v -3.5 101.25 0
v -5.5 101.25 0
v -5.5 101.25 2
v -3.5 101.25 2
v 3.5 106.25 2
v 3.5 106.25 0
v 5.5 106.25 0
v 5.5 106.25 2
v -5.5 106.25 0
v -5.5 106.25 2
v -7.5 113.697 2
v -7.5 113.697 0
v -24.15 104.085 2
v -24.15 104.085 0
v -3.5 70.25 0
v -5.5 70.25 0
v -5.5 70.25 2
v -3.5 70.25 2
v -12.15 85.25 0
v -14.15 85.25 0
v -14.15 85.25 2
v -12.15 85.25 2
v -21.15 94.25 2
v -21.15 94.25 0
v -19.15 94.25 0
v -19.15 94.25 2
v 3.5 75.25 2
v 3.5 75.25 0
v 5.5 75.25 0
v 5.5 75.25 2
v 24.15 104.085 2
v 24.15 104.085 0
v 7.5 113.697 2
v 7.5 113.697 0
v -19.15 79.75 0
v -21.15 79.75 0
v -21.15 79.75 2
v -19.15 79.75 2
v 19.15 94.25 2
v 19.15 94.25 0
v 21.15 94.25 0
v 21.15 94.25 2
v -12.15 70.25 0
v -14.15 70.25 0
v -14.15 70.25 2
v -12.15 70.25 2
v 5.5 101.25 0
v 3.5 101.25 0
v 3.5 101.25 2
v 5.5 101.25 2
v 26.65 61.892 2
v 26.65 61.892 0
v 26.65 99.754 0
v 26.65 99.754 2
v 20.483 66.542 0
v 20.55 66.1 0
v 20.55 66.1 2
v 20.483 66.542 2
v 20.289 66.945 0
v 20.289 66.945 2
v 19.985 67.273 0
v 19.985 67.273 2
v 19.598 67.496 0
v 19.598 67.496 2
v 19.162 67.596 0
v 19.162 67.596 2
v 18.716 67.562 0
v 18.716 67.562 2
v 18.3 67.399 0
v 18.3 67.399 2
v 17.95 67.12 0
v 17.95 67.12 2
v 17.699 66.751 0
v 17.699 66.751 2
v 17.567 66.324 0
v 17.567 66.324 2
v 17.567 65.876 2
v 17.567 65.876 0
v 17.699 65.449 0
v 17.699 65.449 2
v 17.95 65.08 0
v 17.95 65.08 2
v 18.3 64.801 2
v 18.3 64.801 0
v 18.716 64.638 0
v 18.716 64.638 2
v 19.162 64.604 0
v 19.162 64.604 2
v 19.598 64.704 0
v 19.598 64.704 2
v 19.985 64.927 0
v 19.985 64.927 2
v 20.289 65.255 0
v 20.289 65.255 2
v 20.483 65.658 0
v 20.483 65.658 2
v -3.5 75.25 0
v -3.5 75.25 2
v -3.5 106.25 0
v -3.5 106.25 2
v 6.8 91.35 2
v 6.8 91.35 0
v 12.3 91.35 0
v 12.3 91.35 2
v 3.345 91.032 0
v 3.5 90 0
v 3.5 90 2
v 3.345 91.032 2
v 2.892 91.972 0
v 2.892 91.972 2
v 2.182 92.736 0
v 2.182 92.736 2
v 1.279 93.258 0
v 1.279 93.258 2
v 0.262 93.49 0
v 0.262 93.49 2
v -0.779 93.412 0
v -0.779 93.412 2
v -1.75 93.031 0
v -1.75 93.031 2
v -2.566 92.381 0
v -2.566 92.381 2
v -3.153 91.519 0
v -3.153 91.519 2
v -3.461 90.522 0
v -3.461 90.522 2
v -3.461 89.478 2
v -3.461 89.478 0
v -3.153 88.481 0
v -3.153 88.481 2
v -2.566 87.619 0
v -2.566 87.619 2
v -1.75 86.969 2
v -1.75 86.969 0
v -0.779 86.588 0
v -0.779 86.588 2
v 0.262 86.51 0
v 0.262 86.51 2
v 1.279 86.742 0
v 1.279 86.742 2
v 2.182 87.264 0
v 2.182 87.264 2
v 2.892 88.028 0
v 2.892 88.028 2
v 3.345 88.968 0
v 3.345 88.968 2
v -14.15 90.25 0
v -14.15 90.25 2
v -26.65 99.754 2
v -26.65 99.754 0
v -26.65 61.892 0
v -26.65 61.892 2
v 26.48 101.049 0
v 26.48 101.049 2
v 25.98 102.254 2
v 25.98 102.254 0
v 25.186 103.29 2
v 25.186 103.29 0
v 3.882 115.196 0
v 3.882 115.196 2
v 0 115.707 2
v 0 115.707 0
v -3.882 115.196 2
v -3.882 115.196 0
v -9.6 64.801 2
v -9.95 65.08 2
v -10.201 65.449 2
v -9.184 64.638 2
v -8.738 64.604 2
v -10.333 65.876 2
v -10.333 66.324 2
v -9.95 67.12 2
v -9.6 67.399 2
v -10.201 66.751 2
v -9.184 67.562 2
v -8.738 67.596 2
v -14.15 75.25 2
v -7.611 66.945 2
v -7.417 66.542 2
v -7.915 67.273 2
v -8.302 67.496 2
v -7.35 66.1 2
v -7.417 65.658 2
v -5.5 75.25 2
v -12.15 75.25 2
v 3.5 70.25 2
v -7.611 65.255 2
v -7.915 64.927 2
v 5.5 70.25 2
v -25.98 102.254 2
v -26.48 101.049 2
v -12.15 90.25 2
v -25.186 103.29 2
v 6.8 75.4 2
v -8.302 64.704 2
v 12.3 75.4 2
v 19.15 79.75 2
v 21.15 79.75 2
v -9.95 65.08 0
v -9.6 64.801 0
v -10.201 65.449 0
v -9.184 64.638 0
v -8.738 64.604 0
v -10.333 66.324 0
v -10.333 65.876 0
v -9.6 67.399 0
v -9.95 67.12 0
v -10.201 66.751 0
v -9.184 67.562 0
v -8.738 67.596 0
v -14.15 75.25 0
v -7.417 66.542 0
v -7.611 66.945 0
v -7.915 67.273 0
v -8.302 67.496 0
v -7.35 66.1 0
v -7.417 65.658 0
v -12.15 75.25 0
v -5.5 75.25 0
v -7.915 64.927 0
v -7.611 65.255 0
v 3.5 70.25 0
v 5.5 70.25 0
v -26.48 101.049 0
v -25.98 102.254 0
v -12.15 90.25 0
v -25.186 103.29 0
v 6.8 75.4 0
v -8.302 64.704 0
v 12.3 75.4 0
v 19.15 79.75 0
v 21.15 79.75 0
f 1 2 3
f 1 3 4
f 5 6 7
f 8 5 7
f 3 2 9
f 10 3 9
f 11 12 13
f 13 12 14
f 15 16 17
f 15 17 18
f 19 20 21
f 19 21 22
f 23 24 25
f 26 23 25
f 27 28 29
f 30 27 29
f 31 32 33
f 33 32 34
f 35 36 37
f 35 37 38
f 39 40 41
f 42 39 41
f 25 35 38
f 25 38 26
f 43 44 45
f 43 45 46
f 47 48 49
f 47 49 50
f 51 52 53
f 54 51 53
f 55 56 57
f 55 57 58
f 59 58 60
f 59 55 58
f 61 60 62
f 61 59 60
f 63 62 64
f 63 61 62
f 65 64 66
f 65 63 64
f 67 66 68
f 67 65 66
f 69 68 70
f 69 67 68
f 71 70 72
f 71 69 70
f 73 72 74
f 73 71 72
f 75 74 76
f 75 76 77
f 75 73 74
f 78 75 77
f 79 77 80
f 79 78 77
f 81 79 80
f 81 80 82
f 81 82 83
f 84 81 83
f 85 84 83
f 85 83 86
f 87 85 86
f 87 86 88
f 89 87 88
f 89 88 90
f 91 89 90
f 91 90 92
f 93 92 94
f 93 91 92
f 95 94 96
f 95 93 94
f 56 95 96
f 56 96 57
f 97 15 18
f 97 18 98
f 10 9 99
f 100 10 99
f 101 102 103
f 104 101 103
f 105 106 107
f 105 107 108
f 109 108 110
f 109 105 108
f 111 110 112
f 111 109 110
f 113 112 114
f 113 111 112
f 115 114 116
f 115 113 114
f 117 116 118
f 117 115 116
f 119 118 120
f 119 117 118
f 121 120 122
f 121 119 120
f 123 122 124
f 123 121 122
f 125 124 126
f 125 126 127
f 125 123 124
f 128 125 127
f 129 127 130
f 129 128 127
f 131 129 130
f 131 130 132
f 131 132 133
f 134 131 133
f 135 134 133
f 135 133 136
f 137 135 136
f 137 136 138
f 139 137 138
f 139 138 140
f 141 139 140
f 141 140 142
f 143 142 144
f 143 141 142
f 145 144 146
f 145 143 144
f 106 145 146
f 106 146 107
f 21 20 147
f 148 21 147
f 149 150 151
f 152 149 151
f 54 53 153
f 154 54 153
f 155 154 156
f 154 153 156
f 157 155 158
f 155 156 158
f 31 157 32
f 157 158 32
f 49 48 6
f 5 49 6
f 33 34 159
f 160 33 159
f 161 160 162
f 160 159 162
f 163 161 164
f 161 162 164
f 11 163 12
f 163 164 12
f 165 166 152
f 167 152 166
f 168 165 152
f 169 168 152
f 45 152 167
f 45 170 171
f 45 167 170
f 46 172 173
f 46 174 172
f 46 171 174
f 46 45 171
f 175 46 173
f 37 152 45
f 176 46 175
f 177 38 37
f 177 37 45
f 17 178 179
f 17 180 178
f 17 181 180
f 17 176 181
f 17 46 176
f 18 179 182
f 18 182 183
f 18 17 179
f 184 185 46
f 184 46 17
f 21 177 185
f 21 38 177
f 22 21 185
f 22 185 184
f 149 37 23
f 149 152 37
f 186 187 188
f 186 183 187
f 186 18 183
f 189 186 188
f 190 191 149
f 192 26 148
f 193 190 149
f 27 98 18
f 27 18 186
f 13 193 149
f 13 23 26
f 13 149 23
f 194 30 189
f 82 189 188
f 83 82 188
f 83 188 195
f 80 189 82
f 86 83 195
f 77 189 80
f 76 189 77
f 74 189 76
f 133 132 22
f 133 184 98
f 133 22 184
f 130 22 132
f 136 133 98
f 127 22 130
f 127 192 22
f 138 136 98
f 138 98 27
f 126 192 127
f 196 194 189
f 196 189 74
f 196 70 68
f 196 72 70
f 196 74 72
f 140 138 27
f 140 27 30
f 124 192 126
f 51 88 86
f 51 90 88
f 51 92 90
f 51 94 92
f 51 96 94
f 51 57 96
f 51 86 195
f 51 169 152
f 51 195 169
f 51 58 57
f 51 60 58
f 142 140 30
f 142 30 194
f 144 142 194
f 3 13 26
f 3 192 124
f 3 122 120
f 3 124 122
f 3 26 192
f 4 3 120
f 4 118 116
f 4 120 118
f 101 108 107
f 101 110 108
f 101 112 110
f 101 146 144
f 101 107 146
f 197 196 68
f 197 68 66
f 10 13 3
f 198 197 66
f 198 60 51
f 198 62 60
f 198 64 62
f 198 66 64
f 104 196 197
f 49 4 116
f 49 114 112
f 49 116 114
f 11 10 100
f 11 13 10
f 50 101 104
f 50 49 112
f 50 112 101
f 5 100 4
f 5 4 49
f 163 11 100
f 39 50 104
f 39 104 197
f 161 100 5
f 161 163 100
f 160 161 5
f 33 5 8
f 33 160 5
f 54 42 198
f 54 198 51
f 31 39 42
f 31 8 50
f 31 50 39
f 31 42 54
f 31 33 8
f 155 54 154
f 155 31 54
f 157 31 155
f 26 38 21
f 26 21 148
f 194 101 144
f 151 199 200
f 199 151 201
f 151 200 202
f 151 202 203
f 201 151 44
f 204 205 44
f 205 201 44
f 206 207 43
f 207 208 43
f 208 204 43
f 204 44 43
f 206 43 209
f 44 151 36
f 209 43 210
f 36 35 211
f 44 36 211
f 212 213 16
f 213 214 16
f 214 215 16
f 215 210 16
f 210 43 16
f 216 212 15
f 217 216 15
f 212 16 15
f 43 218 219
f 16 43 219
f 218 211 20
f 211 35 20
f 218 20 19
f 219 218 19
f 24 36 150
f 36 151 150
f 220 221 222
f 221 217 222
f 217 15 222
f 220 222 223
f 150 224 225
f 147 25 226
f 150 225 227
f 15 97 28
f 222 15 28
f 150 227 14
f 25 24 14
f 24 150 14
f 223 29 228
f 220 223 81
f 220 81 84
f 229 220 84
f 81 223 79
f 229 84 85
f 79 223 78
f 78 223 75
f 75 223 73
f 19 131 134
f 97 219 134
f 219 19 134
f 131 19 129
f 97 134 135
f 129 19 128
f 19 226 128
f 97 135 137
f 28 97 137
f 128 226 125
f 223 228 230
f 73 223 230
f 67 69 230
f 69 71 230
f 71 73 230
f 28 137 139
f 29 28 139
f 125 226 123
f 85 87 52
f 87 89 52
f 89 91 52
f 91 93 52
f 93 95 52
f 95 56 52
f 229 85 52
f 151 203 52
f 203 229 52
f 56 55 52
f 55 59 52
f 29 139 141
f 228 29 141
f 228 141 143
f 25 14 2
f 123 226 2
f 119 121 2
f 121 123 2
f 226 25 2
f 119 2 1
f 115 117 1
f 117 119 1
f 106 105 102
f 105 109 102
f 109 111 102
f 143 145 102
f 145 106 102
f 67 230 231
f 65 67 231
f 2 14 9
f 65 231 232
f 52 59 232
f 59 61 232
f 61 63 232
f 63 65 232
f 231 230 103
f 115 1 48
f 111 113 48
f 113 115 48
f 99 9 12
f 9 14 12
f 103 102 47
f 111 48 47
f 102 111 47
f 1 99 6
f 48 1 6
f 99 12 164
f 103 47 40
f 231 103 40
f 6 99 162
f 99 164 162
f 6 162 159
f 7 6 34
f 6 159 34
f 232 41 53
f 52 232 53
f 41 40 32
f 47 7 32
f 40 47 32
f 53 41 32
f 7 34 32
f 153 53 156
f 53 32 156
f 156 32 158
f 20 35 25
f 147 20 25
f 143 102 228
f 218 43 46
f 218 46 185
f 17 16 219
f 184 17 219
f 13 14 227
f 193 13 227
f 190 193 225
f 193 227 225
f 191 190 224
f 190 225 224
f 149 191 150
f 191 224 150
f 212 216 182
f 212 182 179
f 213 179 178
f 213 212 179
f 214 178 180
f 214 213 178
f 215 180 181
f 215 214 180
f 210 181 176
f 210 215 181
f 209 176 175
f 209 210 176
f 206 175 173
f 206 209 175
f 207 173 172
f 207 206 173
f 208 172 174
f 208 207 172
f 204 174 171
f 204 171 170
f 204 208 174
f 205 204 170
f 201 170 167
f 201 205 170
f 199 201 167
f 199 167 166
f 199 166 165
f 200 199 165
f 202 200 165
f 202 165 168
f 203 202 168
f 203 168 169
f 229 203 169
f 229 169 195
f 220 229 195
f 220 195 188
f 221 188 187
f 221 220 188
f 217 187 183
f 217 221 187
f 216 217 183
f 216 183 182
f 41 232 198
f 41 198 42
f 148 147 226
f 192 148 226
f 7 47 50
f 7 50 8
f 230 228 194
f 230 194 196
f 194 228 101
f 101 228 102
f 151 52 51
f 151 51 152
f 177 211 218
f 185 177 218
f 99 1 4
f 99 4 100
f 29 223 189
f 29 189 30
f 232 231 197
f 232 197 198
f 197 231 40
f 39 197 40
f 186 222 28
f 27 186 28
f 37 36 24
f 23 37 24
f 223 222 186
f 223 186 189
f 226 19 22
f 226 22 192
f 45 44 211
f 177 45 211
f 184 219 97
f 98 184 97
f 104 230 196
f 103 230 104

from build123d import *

# Parameters (mm, degrees)
SKETCH1_R           = 3.5
SKETCH1_R_2         = 1.5
SKETCH1_R_3         = 2.5
SKETCH1_W           = 2
SKETCH1_H           = 5
SKETCH1_W_2         = 5.5
SKETCH1_H_2         = 15.95
SKETCH1_H_3         = 14.5
BOSS_EXTRUDE1_DEPTH = 2
CUT_EXTRUDE_1_DEPTH = 10


with BuildPart() as part:
    # Sketch1 → Boss-Extrude1 (new body)
    with BuildSketch(Plane.XY):
        with BuildLine():
            Line((-25.65, 0), (25.65, 0))
            ThreePointArc((25.65, 0), (26.357106781, 0.292893219), (26.65, 1))
            Line((26.65, 1), (26.65, 99.754415082))
            ThreePointArc((26.65, 99.754415082), (25.980127019, 102.254415082), (24.15, 104.0845421))
            Line((24.15, 104.0845421), (7.5, 113.697424082))
            ThreePointArc((7.5, 113.697424082), (0, 115.707043026), (-7.5, 113.697424082))
            Line((-7.5, 113.697424082), (-24.15, 104.0845421))
            ThreePointArc((-24.15, 104.0845421), (-25.980127019, 102.254415082), (-26.65, 99.754415082))
            Line((-26.65, 99.754415082), (-26.65, 1))
            ThreePointArc((-26.65, 1), (-26.357106781, 0.292893219), (-25.65, 0))
        make_face()
        with Locations((0, 90)):
            Circle(SKETCH1_R, mode=Mode.SUBTRACT)
        with Locations((19.05, 66.1)):
            Circle(SKETCH1_R_2, mode=Mode.SUBTRACT)
        with Locations((-8.85, 66.1)):
            Circle(SKETCH1_R_2, mode=Mode.SUBTRACT)
        with Locations((-24.05, 15.3)):
            Circle(SKETCH1_R_2, mode=Mode.SUBTRACT)
        with Locations((24.15, 14)):
            Circle(SKETCH1_R_2, mode=Mode.SUBTRACT)
        with Locations((0, 34.3)):
            Circle(SKETCH1_R_3, mode=Mode.SUBTRACT)
        with Locations((4.5, 103.75)):
            Rectangle(SKETCH1_W, SKETCH1_H, mode=Mode.SUBTRACT)
        with Locations((9.55, 83.375)):
            Rectangle(SKETCH1_W_2, SKETCH1_H_2, mode=Mode.SUBTRACT)
        with Locations((20.15, 87)):
            Rectangle(SKETCH1_W, SKETCH1_H_3, mode=Mode.SUBTRACT)
        with Locations((4.5, 72.75)):
            Rectangle(SKETCH1_W, SKETCH1_H, mode=Mode.SUBTRACT)
        with Locations((-4.5, 72.75)):
            Rectangle(SKETCH1_W, SKETCH1_H, mode=Mode.SUBTRACT)
        with Locations((-20.15, 87)):
            Rectangle(SKETCH1_W, SKETCH1_H_3, mode=Mode.SUBTRACT)
        with Locations((-4.5, 103.75)):
            Rectangle(SKETCH1_W, SKETCH1_H, mode=Mode.SUBTRACT)
        with Locations((-13.15, 72.75)):
            Rectangle(SKETCH1_W, SKETCH1_H, mode=Mode.SUBTRACT)
        with Locations((-13.15, 87.75)):
            Rectangle(SKETCH1_W, SKETCH1_H, mode=Mode.SUBTRACT)
        Polygon((-20, 34.3), (-20, 36.05), (-7, 36.05), (-7, 34.3), (-7, 32.55), (-20, 32.55), align=None, mode=Mode.SUBTRACT)
        Polygon((-5.232050808, 39.362177826), (-15.732050808, 57.548711306), (-12.267949192, 59.548711306), (-1.767949192, 41.362177826), align=None, mode=Mode.SUBTRACT)
        Polygon((1.767949192, 41.362177826), (5.232050808, 39.362177826), (15.732050808, 57.548711306), (12.267949192, 59.548711306), align=None, mode=Mode.SUBTRACT)
        Polygon((7, 34.3), (7, 32.55), (20, 32.55), (20, 34.3), (20, 36.05), (7, 36.05), align=None, mode=Mode.SUBTRACT)
        Polygon((-1.767949192, 27.237822174), (-5.232050808, 29.237822174), (-15.732050808, 11.051288694), (-12.267949192, 9.051288694), align=None, mode=Mode.SUBTRACT)
        Polygon((15.732050808, 11.051288694), (12.267949192, 9.051288694), (1.767949192, 27.237822174), (5.232050808, 29.237822174), align=None, mode=Mode.SUBTRACT)
    extrude(amount=BOSS_EXTRUDE1_DEPTH)

    # 草图1 → 切除-拉伸1 (cut)
    with BuildSketch(Plane(origin=(0, 0, 0), x_dir=(-1, 0, 0), z_dir=(0, 0, -1))):
        Polygon((-26.65, 61.892241422), (26.65, 61.892241422), (26.65, 1), (26.65, 0), (-26.65, 0), align=None)
    extrude(amount=-CUT_EXTRUDE_1_DEPTH, mode=Mode.SUBTRACT)


solid = part.part
